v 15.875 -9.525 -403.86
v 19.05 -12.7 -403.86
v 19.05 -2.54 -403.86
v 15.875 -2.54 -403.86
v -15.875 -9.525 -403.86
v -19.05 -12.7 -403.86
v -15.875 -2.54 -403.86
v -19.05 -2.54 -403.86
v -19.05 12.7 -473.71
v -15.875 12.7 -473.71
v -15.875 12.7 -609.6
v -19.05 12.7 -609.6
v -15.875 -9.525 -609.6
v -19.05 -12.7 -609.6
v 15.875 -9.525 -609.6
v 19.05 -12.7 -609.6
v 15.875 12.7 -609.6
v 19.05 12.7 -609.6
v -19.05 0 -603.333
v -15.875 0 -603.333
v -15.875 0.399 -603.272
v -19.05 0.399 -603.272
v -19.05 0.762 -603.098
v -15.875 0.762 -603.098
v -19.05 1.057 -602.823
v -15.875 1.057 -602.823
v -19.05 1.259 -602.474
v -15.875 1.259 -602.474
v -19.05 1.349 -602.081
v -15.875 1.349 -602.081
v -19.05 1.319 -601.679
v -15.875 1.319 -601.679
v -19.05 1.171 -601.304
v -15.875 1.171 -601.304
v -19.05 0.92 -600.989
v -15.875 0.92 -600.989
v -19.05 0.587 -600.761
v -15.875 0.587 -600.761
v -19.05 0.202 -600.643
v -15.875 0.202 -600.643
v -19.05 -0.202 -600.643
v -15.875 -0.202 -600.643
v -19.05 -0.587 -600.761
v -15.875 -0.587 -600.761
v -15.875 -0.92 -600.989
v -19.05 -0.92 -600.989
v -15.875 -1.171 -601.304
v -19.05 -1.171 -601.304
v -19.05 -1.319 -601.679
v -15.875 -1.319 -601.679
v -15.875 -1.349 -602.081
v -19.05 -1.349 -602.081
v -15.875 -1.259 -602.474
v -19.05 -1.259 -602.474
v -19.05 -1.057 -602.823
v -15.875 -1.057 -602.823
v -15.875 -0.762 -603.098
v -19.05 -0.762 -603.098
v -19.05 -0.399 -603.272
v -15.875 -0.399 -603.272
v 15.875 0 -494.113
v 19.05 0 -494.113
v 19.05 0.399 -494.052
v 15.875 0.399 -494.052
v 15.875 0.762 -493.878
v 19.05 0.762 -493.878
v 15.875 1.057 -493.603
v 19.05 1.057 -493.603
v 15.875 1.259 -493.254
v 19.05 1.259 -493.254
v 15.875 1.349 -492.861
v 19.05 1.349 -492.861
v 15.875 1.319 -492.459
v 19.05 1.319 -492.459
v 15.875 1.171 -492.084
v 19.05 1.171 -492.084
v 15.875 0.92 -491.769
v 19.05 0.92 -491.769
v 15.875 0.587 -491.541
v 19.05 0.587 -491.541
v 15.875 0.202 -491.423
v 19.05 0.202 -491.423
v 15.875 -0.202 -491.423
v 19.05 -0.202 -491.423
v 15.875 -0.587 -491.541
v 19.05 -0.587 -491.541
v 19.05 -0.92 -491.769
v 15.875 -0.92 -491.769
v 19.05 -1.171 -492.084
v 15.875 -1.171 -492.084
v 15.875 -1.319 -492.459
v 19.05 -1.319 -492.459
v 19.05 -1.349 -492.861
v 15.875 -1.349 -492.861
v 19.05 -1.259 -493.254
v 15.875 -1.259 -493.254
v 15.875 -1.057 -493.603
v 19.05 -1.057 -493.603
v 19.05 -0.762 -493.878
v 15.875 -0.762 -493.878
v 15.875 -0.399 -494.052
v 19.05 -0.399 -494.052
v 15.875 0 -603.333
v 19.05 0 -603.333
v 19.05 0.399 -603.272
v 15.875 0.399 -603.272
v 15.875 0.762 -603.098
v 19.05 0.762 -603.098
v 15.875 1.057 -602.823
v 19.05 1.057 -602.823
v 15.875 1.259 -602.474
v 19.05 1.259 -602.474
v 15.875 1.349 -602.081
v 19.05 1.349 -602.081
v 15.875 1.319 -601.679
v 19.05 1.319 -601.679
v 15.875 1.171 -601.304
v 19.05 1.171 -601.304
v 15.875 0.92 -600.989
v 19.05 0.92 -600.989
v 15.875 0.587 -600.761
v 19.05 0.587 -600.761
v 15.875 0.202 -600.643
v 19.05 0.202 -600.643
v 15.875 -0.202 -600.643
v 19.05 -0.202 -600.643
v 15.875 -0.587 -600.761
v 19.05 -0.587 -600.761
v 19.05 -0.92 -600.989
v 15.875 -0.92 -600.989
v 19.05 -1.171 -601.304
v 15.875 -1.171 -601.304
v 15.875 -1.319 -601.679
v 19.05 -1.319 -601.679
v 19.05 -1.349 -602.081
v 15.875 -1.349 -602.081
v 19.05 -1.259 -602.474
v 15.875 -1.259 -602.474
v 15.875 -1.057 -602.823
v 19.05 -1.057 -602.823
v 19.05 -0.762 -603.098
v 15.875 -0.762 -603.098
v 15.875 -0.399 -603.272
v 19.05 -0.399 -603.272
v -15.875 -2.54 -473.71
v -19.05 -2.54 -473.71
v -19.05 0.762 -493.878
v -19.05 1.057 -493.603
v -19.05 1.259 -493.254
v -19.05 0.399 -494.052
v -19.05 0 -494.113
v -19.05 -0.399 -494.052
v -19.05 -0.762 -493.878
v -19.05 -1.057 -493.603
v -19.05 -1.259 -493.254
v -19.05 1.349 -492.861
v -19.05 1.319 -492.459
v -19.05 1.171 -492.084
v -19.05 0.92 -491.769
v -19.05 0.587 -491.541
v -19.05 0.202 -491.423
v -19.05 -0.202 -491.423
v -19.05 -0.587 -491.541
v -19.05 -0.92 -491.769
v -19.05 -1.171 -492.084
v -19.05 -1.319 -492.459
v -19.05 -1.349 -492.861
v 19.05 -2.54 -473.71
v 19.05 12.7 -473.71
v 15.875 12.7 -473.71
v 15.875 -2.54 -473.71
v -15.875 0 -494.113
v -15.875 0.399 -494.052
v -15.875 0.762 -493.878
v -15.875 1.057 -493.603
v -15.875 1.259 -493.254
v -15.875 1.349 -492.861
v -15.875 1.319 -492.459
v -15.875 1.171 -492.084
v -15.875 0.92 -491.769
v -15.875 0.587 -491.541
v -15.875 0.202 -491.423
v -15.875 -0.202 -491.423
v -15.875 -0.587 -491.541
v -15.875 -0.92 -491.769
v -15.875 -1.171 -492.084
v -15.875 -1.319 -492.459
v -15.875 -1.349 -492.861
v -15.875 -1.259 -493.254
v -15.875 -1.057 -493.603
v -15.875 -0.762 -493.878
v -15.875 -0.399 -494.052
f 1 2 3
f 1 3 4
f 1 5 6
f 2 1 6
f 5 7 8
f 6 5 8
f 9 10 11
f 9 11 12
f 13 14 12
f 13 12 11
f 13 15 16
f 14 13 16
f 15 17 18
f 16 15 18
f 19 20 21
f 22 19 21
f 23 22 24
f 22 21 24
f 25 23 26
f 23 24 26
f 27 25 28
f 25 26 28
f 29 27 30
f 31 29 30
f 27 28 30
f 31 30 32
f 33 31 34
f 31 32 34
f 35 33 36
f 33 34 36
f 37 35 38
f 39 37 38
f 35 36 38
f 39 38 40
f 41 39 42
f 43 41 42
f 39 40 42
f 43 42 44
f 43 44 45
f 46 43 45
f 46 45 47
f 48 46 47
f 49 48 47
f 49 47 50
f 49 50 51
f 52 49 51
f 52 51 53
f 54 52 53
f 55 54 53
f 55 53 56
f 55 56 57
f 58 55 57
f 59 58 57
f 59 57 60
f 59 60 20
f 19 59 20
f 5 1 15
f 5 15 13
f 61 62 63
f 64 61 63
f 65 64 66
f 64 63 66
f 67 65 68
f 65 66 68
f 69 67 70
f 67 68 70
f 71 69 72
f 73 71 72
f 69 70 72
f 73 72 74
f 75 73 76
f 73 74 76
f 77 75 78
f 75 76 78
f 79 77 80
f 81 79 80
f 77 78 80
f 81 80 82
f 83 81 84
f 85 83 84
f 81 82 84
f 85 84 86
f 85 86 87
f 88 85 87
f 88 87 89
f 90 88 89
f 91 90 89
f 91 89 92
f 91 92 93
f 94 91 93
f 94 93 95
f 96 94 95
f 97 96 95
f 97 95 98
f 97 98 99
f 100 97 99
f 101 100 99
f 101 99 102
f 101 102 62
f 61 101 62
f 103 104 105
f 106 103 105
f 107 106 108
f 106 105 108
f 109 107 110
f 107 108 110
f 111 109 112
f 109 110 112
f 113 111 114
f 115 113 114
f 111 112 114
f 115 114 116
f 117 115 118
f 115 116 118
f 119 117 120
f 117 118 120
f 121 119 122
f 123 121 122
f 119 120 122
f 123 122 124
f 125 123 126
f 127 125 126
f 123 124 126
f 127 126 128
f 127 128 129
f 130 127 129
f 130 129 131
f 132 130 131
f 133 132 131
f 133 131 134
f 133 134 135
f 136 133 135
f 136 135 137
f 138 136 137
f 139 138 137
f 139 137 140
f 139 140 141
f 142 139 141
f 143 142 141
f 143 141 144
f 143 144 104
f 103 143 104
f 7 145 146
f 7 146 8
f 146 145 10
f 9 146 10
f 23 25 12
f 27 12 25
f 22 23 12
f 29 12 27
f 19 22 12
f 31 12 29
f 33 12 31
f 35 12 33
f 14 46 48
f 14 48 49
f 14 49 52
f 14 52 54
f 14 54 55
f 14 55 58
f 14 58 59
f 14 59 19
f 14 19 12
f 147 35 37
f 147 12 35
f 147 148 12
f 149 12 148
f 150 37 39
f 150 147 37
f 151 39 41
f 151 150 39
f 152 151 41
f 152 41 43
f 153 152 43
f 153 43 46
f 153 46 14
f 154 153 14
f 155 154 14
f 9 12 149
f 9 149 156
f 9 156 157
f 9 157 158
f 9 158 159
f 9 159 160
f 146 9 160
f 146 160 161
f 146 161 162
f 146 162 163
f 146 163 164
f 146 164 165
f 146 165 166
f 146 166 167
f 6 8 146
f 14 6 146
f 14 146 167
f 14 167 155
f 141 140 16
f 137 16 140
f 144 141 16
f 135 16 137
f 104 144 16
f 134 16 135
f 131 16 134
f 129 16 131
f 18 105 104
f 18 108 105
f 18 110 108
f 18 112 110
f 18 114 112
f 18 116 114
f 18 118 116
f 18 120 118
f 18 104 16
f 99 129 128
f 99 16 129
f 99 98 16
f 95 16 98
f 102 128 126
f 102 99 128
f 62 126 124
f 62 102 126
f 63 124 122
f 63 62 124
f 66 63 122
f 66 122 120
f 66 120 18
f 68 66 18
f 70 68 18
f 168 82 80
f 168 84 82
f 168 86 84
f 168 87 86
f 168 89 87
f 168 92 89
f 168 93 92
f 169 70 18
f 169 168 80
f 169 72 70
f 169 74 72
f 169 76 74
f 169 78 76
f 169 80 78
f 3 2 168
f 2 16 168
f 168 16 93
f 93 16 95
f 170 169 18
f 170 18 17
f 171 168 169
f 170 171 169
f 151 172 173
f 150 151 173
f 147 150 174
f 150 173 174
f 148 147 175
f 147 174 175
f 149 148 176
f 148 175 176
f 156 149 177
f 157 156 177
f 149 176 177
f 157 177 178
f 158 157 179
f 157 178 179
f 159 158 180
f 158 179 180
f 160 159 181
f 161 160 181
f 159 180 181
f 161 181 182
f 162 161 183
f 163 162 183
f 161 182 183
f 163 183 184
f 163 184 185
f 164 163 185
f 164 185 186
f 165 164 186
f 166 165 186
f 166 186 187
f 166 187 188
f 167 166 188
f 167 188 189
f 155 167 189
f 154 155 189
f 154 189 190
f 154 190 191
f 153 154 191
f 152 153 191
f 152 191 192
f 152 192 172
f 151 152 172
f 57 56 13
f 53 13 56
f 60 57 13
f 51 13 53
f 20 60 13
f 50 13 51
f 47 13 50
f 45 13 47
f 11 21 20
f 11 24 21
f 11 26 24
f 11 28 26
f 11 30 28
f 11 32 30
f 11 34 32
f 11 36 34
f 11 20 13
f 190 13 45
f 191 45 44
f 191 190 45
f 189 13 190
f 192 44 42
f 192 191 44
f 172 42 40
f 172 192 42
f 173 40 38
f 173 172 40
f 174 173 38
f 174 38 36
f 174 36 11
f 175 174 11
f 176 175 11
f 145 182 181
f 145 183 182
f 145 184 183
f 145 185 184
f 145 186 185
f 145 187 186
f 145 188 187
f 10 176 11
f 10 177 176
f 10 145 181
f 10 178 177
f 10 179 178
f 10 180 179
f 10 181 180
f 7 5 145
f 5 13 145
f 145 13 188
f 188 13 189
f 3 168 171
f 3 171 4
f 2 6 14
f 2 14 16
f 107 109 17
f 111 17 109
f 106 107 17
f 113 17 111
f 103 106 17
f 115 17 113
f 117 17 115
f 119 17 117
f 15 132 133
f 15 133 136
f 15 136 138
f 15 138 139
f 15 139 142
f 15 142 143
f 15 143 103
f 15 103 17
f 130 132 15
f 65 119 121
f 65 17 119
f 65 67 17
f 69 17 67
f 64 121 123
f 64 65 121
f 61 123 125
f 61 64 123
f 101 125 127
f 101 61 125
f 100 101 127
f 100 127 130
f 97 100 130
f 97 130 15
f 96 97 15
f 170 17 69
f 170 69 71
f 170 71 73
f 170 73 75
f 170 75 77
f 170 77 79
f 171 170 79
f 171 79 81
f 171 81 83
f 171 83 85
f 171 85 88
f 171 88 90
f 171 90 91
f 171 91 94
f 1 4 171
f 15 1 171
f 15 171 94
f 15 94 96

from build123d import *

# Parameters (mm, degrees)
BOSS_EXTRUDE2_DEPTH     = 609.6
CUT_EXTRUDE1_DEPTH      = 1013.46
F_6_32_TAPPED_HOLE1_D   = 2.7051
F_6_32_TAPPED_HOLE2_D   = 2.7051
CUT_EXTRUDE4_DEPTH      = 611.921484317
CUT_EXTRUDE4_DEPTH_BACK = 611.921484317
SKETCH13_W              = 69.85
SKETCH13_H              = 15.24


with BuildPart() as part:
    # Sketch3 → Boss-Extrude2 (new, symmetric)
    with BuildSketch(Plane.XY):
        Polygon((-19.05, 12.7), (-19.05, -12.7), (19.05, -12.7), (19.05, 12.7), (15.875, 12.7), (15.875, -9.525), (-15.875, -9.525), (-15.875, 12.7), align=None)
    extrude(amount=BOSS_EXTRUDE2_DEPTH, both=True)

    # Sketch5 → Cut-Extrude1 (cut)
    with BuildSketch(Plane.XY.offset(609.6)):
        Polygon((-19.05, 12.7), (-15.875, 12.7), (-15.875, -9.525), (15.875, -9.525), (15.875, 12.7), (19.05, 12.7), (19.05, -12.7), (-19.05, -12.7), align=None)
    extrude(amount=-CUT_EXTRUDE1_DEPTH, mode=Mode.SUBTRACT)

    # #6-32 Tapped Hole1 (through all)
    with Locations(Plane.ZY.offset(19.05)):
        with Locations((-601.98, 0)):
            Hole(F_6_32_TAPPED_HOLE1_D / 2)

    # #6-32 Tapped Hole2 (through all)
    with Locations(Plane.ZY.offset(19.05)):
        with Locations((-492.76, 0)):
            Hole(F_6_32_TAPPED_HOLE2_D / 2)

    # Sketch13 → Cut-Extrude4 (cut, two sides: drawn at the far end of the back side and taken through both)
    with BuildSketch(Plane.ZY.offset(19.05).offset(-CUT_EXTRUDE4_DEPTH_BACK)):
        with Locations((-438.785, 5.08)):
            Rectangle(SKETCH13_W, SKETCH13_H)
    extrude(amount=CUT_EXTRUDE4_DEPTH + CUT_EXTRUDE4_DEPTH_BACK, mode=Mode.SUBTRACT)


solid = part.part
